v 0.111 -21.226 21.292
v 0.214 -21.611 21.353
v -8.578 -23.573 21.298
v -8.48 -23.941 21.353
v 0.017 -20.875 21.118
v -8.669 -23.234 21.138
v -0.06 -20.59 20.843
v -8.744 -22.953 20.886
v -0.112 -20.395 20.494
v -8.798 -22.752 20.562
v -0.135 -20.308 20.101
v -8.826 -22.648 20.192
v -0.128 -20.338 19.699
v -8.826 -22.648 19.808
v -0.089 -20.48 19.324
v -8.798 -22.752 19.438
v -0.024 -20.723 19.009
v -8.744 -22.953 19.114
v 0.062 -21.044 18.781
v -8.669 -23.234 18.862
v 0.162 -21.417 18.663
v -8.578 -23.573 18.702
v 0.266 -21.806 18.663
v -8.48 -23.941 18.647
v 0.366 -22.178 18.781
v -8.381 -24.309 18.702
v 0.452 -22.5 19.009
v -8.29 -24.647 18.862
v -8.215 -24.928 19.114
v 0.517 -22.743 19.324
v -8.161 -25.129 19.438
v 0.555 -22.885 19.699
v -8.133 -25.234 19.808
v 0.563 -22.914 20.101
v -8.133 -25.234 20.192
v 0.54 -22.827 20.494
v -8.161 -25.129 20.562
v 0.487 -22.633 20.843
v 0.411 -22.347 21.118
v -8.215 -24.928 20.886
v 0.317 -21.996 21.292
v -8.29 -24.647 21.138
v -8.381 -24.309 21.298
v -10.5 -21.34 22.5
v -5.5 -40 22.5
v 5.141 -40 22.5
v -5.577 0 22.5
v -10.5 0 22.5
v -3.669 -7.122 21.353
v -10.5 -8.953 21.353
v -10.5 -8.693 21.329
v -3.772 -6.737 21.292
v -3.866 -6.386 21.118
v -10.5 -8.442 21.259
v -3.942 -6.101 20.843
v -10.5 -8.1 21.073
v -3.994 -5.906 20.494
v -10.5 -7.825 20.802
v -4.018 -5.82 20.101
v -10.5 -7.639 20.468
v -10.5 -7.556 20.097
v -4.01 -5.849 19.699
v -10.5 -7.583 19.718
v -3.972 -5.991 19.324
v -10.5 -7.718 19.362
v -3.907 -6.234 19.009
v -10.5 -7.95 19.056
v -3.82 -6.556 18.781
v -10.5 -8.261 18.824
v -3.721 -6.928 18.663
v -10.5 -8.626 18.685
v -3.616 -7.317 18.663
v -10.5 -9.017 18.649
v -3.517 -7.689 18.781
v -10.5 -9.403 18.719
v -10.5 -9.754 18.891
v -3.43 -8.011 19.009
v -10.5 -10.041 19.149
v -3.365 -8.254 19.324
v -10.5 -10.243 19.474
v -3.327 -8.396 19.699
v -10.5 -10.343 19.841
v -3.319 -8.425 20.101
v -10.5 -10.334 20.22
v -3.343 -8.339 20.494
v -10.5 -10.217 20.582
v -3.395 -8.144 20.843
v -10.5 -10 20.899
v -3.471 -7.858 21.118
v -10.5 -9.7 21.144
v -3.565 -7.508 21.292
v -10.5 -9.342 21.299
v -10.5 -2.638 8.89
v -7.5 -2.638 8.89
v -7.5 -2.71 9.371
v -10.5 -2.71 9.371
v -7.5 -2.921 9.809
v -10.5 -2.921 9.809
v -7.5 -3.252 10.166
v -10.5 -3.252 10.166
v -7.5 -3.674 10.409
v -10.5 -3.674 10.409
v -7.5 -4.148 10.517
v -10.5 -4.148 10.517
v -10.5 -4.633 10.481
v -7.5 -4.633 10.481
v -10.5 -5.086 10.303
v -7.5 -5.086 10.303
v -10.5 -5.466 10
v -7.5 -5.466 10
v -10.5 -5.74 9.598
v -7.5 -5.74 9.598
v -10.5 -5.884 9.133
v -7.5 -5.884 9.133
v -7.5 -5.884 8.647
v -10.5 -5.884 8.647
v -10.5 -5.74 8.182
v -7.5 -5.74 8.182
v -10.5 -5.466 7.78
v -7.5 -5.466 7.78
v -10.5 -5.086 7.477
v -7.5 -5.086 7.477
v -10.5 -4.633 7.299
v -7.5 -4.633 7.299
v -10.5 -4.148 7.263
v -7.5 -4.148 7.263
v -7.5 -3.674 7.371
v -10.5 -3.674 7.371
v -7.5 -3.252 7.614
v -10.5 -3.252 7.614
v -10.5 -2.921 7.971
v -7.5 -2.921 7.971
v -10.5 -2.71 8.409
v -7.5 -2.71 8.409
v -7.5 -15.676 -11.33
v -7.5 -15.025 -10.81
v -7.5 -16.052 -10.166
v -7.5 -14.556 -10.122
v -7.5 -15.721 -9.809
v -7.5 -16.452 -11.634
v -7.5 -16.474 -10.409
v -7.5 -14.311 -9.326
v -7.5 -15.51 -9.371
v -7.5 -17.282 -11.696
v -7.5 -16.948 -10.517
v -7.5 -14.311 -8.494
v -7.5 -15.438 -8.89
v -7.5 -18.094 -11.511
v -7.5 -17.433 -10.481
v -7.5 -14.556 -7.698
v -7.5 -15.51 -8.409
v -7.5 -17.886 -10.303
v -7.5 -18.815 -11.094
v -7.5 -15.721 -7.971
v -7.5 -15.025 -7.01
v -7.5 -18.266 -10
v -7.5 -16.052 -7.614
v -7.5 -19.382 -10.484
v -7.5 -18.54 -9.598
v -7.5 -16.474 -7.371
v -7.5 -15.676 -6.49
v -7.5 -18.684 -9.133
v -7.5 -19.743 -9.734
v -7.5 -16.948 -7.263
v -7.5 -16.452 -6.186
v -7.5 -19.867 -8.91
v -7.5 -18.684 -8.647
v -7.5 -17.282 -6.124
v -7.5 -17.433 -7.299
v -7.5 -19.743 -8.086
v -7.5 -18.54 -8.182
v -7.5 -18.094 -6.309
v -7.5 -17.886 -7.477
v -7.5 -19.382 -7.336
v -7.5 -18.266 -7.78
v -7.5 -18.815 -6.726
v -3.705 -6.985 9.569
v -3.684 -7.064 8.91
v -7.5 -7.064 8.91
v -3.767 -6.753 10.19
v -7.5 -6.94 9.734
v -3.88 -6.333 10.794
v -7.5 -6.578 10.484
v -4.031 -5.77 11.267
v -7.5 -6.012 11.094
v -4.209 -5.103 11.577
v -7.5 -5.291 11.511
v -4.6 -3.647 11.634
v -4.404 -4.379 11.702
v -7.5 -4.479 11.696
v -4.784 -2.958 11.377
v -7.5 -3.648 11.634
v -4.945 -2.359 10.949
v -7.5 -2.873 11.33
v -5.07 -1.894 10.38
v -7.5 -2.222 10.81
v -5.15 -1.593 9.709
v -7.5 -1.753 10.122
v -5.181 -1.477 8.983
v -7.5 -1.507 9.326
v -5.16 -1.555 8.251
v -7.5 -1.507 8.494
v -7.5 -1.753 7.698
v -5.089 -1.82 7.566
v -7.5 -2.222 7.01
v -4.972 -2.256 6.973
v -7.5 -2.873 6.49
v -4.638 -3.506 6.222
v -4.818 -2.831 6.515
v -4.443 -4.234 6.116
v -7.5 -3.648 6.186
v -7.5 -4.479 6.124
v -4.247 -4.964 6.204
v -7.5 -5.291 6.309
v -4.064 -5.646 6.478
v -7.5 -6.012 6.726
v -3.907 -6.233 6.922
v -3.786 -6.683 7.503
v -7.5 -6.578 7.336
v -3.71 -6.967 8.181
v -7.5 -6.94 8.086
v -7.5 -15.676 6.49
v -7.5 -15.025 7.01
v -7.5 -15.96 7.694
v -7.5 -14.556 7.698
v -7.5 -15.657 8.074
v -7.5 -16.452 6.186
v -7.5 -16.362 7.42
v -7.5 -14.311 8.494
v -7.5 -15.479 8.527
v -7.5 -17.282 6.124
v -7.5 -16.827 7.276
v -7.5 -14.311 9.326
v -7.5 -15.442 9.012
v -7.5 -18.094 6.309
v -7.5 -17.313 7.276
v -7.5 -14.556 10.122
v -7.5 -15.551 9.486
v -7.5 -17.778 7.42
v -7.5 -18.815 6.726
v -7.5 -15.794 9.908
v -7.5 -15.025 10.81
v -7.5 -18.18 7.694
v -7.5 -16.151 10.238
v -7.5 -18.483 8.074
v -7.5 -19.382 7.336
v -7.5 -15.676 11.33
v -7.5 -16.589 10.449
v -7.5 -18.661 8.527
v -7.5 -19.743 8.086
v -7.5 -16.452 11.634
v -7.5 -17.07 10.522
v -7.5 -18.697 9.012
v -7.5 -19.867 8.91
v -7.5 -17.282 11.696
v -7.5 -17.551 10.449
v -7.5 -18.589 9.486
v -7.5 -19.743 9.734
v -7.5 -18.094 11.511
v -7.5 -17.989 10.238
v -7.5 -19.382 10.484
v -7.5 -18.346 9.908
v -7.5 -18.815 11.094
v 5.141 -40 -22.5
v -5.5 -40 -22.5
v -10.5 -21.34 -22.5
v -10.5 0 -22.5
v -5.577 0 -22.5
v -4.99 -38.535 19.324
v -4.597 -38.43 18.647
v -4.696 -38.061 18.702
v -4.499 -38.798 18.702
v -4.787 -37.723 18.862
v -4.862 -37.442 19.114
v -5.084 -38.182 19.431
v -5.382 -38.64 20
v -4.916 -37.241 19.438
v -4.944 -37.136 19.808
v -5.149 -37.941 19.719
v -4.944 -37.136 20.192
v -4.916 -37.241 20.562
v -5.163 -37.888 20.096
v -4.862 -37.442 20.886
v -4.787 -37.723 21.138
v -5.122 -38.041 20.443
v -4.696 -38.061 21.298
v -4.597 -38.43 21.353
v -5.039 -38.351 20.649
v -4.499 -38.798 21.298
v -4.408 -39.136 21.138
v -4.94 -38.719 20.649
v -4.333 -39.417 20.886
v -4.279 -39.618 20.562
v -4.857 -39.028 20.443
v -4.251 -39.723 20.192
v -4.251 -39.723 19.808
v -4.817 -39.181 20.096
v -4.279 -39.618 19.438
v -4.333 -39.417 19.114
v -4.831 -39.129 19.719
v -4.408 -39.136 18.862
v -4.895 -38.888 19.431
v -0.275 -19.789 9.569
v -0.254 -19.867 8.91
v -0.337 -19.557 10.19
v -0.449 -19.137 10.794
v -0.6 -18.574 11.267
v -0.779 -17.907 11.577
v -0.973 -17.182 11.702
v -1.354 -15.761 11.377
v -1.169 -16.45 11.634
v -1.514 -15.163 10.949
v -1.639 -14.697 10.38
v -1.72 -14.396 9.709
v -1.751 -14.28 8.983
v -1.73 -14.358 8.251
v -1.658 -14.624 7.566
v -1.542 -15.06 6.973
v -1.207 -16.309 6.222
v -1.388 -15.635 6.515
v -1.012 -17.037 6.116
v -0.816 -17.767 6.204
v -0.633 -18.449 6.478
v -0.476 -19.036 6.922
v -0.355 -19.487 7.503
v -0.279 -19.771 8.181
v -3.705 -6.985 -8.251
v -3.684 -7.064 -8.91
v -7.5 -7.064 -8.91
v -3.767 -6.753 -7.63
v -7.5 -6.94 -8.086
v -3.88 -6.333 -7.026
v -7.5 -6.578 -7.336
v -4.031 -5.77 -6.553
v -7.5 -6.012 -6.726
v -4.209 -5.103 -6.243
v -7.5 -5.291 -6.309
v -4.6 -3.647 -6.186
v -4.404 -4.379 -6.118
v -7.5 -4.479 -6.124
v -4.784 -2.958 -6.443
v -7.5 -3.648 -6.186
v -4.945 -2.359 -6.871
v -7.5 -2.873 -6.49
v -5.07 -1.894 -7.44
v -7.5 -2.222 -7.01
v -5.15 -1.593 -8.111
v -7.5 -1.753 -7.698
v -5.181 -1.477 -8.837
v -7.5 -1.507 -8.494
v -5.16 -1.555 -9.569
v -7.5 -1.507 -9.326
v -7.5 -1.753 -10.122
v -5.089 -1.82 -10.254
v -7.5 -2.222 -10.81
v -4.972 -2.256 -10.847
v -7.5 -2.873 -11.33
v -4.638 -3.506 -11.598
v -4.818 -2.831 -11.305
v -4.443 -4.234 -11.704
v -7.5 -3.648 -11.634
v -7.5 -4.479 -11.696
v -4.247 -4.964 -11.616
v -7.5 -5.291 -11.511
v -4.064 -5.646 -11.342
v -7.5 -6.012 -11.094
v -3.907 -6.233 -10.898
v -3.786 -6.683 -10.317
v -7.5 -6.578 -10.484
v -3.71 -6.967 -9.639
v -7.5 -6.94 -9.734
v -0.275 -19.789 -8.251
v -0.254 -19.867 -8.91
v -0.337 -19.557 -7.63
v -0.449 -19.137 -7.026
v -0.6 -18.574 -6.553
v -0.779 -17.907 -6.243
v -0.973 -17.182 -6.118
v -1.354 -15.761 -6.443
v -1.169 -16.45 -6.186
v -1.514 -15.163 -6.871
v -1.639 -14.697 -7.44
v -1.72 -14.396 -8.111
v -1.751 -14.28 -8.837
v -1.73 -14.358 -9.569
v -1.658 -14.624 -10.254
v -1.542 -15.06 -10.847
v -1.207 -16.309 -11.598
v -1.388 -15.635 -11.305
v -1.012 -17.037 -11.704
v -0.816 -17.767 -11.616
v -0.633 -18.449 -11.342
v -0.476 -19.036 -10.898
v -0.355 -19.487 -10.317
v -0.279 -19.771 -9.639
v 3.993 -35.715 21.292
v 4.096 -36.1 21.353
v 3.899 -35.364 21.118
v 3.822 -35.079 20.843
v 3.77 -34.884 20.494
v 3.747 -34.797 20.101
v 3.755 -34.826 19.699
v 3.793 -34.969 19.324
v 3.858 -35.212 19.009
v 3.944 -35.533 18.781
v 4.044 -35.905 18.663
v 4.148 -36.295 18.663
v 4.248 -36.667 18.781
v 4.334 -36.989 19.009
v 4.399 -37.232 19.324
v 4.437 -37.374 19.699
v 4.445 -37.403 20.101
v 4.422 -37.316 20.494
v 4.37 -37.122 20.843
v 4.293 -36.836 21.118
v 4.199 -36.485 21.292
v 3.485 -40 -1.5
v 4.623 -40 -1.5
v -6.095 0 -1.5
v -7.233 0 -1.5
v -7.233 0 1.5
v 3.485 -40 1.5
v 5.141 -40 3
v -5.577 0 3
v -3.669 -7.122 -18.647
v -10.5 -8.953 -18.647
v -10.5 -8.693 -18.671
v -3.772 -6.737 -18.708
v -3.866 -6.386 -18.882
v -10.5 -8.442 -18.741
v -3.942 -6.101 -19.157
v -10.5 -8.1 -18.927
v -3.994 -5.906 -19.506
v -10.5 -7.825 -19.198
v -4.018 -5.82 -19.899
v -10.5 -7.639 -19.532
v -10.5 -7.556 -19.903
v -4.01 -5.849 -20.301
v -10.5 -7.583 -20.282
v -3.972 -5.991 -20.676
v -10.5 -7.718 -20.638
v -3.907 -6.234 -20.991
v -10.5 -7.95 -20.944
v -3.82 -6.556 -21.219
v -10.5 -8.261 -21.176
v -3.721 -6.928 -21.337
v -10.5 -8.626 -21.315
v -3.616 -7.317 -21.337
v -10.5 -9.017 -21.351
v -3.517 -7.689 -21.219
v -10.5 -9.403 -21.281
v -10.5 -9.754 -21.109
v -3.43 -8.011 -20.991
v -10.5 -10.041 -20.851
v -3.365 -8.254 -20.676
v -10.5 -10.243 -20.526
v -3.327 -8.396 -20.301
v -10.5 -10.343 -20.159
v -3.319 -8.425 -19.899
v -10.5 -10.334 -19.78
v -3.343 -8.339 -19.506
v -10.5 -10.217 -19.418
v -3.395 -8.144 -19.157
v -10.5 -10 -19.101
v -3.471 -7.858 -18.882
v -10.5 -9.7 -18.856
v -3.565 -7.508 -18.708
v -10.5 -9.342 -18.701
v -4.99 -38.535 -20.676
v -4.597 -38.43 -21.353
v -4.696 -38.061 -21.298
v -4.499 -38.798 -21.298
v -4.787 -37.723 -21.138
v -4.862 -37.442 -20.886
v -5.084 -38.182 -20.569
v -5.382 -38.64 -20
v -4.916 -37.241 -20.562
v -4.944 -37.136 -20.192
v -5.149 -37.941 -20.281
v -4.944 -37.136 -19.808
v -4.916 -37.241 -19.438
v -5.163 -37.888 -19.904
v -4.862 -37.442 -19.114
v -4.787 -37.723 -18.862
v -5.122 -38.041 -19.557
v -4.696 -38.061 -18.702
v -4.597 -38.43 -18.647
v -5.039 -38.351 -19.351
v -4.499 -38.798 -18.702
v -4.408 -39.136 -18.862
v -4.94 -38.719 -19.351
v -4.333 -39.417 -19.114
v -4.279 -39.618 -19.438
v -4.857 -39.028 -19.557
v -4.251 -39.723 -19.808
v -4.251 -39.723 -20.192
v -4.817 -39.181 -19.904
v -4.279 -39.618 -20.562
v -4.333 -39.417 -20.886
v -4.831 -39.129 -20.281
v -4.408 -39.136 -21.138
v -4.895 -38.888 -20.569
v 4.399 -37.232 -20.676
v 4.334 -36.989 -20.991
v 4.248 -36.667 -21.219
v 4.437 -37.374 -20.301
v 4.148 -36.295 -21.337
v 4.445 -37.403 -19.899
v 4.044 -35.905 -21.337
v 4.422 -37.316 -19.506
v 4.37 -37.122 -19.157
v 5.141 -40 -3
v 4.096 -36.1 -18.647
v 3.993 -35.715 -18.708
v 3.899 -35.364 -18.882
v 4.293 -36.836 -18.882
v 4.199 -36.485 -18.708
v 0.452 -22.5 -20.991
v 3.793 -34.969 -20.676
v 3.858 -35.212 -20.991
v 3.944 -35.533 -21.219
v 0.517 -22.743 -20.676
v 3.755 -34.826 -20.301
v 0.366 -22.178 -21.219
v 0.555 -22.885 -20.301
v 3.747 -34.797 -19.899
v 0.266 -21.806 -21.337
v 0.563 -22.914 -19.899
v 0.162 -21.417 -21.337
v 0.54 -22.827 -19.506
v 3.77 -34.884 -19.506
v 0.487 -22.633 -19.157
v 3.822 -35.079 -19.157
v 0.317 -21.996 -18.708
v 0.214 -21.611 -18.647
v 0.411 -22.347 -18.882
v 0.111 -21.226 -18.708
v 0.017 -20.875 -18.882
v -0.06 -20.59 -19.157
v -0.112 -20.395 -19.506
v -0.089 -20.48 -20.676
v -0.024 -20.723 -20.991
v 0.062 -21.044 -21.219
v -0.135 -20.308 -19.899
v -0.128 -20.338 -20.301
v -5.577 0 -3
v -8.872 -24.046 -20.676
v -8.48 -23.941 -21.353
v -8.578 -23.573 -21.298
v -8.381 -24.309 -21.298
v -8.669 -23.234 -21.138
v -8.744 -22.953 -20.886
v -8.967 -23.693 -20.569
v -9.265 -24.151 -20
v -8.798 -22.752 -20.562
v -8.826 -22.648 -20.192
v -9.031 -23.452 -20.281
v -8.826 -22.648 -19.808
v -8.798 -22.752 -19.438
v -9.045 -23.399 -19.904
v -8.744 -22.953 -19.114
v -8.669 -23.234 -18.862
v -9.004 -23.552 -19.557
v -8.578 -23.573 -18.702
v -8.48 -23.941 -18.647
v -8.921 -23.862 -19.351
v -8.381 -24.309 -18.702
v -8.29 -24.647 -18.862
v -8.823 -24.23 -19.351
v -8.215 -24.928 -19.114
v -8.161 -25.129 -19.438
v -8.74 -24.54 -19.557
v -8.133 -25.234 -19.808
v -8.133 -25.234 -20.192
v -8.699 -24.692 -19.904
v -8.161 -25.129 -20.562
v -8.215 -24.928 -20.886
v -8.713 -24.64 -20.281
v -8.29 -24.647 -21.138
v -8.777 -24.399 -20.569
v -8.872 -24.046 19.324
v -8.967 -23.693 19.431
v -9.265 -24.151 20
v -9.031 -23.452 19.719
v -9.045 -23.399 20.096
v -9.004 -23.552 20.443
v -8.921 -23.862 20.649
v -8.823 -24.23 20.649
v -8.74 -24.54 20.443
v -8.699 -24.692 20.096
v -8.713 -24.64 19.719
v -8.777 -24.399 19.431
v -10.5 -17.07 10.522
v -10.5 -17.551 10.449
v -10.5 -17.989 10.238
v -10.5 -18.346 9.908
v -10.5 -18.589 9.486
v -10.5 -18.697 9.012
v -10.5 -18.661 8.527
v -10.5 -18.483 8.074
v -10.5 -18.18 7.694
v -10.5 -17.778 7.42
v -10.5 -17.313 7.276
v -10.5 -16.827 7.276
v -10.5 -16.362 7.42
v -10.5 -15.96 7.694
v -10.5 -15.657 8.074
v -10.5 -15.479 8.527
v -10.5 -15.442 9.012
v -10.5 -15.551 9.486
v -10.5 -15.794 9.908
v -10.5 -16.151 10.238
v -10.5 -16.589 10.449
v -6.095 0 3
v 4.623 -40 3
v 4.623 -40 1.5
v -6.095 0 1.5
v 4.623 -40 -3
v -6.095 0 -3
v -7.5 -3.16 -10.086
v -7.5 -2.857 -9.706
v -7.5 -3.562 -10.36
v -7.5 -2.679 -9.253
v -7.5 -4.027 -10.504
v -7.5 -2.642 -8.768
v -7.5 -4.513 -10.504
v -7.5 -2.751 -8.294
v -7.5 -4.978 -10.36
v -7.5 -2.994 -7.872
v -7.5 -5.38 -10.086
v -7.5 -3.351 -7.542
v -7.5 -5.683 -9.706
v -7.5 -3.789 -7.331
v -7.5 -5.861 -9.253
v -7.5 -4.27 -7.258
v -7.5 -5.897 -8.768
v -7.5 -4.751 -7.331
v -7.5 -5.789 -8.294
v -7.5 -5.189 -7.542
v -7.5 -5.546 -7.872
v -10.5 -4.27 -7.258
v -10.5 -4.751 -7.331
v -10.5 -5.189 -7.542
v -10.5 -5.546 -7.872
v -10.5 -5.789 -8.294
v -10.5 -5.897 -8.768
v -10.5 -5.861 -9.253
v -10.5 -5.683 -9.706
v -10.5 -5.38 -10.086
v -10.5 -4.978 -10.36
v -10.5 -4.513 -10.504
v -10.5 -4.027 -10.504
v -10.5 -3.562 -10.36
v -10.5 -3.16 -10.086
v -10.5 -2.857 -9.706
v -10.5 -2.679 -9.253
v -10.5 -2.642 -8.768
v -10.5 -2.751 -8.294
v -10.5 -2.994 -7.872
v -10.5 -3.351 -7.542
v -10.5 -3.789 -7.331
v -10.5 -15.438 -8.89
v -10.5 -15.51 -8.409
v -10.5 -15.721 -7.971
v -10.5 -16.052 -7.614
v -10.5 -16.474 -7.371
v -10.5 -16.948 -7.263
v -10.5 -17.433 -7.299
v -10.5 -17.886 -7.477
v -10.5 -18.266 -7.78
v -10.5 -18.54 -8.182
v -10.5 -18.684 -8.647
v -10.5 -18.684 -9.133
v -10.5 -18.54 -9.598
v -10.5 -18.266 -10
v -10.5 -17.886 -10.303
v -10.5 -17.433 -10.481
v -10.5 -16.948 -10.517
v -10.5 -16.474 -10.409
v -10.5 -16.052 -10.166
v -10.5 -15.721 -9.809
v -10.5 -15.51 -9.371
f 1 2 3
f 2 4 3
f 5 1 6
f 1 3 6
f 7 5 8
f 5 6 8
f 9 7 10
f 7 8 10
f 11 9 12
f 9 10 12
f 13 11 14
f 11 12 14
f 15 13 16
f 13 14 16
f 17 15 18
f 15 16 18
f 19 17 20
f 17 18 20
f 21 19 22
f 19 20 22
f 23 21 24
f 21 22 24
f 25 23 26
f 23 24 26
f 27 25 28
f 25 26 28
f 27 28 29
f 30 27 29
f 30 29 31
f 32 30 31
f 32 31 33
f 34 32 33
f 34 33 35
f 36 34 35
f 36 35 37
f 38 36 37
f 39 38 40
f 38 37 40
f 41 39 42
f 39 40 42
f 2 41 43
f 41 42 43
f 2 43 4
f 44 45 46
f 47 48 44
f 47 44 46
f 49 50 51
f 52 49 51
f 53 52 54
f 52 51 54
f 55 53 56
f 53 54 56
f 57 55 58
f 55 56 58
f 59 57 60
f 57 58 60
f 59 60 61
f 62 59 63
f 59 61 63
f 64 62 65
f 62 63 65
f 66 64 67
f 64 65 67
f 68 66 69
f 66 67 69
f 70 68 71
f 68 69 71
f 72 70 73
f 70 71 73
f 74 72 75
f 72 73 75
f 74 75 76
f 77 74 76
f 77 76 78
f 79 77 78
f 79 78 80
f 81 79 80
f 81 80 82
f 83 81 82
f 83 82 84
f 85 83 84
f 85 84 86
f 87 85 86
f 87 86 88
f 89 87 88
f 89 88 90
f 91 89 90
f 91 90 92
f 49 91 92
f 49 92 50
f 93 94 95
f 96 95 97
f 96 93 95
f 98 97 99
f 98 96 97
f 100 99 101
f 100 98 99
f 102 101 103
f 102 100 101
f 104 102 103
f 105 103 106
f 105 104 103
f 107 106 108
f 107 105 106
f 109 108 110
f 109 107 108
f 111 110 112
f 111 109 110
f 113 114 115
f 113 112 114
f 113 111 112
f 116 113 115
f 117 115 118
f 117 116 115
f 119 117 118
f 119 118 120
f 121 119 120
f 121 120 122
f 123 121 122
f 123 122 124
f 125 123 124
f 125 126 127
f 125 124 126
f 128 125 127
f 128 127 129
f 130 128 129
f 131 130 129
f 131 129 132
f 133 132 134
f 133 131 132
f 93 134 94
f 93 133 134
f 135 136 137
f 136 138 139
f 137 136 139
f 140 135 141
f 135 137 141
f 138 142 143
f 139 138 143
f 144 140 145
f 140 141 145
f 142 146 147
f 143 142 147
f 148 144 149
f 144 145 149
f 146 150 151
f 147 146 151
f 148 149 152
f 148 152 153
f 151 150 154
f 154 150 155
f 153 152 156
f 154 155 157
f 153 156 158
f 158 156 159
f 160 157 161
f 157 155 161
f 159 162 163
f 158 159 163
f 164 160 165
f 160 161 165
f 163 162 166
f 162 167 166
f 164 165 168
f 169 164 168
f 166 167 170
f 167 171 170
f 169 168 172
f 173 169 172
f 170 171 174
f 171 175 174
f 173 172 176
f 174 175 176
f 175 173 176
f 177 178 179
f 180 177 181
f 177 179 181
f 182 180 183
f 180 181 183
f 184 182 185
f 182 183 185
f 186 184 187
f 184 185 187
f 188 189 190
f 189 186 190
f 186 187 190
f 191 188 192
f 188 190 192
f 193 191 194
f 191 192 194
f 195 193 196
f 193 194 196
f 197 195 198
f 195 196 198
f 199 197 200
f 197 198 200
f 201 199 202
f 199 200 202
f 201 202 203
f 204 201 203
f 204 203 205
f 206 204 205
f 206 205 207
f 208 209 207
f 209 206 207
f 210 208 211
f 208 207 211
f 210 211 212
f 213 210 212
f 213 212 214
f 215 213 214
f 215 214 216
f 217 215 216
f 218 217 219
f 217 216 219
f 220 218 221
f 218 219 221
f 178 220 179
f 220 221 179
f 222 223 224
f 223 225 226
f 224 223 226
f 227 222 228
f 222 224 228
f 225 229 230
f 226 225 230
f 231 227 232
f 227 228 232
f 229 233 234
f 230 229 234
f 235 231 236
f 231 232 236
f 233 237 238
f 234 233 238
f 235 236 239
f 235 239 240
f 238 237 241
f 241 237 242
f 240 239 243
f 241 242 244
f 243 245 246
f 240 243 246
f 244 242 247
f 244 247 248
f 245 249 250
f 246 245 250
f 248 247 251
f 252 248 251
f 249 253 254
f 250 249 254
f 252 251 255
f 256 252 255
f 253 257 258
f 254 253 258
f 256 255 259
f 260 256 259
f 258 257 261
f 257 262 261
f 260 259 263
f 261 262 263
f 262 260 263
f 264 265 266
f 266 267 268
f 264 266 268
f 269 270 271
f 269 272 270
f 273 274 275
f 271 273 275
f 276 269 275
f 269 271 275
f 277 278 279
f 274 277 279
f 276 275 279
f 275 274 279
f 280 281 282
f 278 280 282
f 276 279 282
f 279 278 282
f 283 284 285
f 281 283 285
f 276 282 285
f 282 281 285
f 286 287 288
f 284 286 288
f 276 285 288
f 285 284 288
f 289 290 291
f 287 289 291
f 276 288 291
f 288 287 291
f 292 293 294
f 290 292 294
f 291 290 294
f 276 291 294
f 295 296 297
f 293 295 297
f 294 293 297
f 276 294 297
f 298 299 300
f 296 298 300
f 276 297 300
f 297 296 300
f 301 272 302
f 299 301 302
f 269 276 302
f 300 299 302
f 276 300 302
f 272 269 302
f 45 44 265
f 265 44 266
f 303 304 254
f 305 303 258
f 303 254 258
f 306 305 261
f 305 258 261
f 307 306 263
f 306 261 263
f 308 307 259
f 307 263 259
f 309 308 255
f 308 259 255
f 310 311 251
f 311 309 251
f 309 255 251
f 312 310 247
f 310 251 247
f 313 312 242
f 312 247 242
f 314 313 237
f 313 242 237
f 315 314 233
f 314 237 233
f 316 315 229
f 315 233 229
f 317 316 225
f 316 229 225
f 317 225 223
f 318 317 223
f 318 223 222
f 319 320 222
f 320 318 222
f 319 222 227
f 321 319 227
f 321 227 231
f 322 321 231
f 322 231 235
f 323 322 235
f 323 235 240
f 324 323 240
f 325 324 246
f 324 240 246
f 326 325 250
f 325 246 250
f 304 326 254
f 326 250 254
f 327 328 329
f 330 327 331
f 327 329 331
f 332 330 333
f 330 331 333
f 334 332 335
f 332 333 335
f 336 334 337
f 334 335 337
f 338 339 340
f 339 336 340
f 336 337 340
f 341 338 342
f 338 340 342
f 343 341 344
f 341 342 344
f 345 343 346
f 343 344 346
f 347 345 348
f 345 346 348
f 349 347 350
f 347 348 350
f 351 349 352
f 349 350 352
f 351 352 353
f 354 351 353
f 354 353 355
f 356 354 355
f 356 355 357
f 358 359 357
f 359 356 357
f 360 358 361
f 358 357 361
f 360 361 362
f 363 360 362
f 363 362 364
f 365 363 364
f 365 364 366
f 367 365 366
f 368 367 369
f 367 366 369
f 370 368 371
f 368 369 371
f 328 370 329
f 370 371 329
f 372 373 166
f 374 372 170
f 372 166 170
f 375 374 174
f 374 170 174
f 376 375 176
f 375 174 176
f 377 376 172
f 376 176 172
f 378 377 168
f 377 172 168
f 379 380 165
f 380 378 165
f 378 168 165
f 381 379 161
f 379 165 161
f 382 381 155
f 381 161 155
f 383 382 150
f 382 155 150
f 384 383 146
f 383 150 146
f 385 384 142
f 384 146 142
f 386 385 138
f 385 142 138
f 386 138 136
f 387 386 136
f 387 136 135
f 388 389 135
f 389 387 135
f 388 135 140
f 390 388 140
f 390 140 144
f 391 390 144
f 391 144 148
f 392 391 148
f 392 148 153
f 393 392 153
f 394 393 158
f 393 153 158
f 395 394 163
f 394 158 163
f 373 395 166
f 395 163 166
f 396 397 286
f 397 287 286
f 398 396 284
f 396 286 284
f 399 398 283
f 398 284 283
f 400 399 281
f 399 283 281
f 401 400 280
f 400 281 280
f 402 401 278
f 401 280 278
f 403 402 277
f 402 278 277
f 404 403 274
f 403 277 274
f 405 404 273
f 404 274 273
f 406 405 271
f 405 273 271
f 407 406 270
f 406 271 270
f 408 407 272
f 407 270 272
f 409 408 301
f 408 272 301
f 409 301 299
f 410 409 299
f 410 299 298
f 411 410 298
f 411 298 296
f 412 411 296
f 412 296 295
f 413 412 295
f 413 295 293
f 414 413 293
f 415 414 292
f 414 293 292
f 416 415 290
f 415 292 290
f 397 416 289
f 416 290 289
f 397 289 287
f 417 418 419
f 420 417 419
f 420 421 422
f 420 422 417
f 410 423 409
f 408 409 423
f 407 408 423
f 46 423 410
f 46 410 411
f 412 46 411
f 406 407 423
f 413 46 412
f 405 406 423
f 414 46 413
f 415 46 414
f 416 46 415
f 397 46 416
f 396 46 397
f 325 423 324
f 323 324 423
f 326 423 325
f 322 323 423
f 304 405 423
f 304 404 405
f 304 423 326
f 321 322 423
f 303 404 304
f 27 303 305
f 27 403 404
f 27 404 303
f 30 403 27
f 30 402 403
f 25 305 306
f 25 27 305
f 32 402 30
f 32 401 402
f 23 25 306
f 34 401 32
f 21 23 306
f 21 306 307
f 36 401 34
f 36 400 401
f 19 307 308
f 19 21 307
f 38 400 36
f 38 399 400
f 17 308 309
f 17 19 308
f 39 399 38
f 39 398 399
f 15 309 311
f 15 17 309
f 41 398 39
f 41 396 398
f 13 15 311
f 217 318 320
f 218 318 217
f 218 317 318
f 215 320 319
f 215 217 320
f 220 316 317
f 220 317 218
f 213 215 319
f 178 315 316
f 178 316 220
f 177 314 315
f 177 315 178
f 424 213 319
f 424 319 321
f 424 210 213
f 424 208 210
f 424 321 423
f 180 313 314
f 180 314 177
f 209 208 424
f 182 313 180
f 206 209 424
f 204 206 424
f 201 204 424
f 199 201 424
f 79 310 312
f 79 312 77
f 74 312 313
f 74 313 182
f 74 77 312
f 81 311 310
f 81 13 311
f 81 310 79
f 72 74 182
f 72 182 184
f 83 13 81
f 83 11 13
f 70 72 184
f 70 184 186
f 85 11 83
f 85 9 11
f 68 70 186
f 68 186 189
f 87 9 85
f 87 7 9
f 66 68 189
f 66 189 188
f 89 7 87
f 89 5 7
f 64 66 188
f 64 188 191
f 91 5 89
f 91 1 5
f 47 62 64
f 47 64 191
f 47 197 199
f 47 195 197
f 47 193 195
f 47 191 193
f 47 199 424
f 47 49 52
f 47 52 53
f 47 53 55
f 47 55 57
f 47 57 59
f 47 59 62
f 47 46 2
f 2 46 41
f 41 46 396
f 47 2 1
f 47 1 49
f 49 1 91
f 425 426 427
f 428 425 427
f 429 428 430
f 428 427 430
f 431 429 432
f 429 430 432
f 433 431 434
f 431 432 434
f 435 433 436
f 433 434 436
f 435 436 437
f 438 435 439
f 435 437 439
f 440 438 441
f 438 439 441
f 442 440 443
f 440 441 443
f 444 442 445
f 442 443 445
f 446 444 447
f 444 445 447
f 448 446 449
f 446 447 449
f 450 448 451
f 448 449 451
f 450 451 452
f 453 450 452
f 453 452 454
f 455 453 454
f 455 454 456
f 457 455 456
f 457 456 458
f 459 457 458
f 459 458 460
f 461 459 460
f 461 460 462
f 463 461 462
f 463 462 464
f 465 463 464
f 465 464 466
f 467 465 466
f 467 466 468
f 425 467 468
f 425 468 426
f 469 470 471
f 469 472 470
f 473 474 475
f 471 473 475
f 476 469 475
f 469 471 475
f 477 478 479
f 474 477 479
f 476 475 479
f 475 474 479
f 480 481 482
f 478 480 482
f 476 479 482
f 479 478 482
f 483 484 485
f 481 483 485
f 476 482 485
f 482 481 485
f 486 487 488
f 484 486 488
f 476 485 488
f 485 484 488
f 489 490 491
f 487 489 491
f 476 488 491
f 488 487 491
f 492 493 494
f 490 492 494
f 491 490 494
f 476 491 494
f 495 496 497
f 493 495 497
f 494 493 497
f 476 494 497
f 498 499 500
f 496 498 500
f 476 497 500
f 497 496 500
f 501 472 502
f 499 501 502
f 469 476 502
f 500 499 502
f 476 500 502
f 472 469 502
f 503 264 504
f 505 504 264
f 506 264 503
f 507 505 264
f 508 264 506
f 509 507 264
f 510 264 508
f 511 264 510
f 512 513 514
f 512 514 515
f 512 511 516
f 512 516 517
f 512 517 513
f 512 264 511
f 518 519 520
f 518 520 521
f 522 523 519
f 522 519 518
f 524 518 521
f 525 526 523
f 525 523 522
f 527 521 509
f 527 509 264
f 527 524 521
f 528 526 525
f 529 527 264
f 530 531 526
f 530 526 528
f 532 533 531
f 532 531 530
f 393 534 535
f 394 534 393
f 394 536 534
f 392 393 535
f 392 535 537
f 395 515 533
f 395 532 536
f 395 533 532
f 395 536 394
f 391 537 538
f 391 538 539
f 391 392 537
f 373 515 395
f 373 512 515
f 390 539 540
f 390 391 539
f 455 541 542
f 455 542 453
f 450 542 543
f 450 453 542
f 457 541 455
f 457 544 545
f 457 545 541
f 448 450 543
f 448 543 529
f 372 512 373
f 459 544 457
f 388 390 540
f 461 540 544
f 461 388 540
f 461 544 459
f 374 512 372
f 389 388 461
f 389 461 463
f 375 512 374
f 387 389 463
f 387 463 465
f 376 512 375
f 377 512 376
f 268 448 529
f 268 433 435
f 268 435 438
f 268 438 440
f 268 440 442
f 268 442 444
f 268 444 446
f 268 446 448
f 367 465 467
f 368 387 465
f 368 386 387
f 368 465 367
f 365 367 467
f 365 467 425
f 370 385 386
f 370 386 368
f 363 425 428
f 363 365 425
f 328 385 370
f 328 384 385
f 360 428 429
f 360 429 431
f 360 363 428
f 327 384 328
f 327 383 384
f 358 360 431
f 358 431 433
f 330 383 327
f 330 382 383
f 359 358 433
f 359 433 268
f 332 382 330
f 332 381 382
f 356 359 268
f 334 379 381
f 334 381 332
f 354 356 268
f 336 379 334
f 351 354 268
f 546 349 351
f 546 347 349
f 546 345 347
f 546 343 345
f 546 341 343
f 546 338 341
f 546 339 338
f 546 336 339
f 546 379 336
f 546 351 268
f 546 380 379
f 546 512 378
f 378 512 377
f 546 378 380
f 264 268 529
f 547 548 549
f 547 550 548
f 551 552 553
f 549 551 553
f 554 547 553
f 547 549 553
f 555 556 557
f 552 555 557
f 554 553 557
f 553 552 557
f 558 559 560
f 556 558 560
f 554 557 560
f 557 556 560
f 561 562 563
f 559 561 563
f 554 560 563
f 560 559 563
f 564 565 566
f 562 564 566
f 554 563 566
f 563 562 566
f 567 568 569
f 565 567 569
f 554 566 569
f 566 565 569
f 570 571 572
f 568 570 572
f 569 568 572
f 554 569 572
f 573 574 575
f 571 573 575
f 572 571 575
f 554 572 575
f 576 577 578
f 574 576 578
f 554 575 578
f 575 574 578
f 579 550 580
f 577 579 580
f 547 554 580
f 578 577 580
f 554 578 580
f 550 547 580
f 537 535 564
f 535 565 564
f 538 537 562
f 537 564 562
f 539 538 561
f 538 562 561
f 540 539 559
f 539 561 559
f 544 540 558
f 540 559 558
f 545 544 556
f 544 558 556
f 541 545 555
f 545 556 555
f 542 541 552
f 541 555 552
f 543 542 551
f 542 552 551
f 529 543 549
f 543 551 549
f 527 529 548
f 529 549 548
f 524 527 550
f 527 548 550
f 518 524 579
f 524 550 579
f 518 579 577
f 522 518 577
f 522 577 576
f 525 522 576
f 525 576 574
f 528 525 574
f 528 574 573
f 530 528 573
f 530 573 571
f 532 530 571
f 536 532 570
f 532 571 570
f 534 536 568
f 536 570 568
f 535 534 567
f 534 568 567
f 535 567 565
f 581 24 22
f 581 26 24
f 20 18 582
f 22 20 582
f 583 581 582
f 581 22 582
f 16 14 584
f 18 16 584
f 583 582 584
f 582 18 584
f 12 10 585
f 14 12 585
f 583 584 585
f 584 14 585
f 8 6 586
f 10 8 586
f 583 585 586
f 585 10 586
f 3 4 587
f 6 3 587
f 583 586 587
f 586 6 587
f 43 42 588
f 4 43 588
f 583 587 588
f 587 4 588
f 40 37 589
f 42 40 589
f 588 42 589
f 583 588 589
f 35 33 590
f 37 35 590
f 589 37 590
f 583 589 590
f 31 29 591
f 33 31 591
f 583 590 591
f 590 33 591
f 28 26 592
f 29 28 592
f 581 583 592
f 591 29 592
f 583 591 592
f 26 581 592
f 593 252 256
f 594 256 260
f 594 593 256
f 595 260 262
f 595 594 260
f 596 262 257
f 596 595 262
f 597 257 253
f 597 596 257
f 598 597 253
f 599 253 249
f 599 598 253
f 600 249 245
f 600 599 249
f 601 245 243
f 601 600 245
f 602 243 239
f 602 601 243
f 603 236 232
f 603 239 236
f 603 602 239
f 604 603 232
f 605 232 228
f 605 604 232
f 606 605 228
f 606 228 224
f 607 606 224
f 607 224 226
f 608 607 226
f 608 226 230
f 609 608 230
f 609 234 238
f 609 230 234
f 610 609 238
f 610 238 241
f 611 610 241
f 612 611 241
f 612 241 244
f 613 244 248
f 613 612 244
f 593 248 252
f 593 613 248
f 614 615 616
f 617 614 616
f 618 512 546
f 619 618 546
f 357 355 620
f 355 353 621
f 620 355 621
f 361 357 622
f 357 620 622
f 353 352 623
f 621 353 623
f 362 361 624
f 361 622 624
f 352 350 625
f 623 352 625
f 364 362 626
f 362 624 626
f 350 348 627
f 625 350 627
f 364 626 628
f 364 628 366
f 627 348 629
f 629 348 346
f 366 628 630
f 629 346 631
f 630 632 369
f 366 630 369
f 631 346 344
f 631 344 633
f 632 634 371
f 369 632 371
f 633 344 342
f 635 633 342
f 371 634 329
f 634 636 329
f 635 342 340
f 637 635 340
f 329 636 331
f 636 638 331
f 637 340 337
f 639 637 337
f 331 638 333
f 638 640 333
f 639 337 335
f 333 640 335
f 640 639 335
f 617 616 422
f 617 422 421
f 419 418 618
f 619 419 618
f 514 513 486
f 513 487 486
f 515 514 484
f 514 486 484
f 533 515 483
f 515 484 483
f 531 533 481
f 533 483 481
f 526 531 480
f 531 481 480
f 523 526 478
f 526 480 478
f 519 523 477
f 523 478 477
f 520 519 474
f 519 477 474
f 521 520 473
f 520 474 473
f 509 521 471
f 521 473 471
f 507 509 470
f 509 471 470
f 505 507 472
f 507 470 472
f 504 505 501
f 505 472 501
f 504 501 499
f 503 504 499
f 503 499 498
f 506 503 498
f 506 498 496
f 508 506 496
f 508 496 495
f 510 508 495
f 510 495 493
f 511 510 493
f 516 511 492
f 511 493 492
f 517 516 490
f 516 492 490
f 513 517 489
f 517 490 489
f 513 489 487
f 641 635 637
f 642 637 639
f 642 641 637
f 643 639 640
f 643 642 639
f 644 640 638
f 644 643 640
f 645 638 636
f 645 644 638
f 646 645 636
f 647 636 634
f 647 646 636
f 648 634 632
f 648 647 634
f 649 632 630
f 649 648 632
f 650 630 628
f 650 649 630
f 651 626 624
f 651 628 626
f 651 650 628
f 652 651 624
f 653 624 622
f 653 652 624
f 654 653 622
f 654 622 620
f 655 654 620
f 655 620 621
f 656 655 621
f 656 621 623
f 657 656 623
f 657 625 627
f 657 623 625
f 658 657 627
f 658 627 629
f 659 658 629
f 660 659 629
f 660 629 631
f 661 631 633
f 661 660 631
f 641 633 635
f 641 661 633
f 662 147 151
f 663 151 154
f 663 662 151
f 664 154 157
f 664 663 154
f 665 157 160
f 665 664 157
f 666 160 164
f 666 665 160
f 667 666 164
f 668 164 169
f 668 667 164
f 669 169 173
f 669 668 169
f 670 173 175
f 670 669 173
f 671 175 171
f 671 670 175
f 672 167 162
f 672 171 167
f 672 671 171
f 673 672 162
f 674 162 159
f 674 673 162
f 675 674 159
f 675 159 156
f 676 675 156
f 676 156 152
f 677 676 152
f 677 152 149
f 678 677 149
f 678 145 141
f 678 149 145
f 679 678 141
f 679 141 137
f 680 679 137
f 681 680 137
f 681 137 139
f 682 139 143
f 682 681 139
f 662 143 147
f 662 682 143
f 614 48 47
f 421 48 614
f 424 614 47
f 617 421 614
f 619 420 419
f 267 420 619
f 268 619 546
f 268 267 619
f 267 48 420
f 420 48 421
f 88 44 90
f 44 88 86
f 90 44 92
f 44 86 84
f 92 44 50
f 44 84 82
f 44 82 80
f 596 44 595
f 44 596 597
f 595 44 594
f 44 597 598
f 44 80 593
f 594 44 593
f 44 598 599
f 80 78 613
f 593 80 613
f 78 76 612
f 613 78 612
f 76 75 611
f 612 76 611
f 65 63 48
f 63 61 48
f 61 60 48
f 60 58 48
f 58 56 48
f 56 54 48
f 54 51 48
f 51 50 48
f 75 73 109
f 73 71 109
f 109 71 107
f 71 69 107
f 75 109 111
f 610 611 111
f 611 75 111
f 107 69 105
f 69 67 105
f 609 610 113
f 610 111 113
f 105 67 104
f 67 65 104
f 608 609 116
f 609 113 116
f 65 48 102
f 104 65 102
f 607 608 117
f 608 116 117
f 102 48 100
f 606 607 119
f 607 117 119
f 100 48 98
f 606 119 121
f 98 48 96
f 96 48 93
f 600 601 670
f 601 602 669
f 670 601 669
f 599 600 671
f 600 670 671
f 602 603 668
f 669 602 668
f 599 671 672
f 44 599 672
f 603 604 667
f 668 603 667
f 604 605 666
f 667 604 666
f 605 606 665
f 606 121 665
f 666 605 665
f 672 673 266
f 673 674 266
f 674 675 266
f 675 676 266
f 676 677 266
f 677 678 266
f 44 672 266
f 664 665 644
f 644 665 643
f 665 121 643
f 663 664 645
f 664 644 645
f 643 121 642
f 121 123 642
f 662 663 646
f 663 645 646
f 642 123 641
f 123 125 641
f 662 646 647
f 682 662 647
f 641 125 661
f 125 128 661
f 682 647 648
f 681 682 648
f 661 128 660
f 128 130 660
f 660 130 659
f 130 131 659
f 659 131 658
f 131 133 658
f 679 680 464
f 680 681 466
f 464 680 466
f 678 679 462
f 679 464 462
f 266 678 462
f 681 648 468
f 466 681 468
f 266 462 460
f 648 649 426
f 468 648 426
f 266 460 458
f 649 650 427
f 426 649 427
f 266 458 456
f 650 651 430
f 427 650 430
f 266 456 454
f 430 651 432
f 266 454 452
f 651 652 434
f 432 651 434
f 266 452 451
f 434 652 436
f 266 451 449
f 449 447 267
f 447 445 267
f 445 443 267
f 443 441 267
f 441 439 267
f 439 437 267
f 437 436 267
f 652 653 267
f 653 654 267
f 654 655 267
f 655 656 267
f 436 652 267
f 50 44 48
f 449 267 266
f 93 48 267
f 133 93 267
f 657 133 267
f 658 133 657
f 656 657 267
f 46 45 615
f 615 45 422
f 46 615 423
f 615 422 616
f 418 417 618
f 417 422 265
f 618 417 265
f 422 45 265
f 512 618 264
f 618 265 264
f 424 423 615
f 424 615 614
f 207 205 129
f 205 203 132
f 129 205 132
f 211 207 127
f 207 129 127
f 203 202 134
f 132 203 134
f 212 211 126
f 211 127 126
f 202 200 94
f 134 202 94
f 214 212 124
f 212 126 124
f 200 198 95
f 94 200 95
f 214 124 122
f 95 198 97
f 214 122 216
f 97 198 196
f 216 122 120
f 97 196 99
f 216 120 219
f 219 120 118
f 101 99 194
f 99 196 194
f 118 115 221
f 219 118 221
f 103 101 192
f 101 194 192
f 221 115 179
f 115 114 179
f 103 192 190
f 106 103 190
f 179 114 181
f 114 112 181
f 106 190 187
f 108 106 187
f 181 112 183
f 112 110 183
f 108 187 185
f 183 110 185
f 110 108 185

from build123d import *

# Parameters (mm, degrees)
SKETCH1_W                 = 21
SKETCH1_H                 = 45
BOSS_EXTRUDE1_DEPTH       = 40
CHAMFER1_SIZE             = 60
CHAMFER1_SIZE_2           = 16.076951546
SKETCH2_W                 = 3
SKETCH2_H                 = 45
CUT_EXTRUDE1_DEPTH        = 1.6
F_6_32_TAPPED_HOLE1_D     = 2.7051
F_6_32_TAPPED_HOLE1_DEPTH = 9
F_6_32_TAPPED_HOLE1_TIP   = 0.81269403
CHAMFER2_SIZE             = 5
CHAMFER2_SIZE2            = 18.660254038
SKETCH11_R                = 1.63195
CUT_EXTRUDE3_DEPTH        = 10
F_3DSKETCH1_R             = 2.794
CUT_EXTRUDE4_DEPTH        = 8
SKETCH12_W                = 6
SKETCH12_H                = 45
CUT_EXTRUDE5_DEPTH        = 0.5


with BuildPart() as part:
    # Sketch1 → Boss-Extrude1 (new body)
    with BuildSketch(Plane(origin=(0, 0, 0), x_dir=(1, 0, 0), z_dir=(0, 1, 0))):
        Rectangle(SKETCH1_W, SKETCH1_H)
    extrude(amount=-BOSS_EXTRUDE1_DEPTH)

    # Chamfer1
    # the kernel refuses this chamfer: 60, 16.076951546 mm, written as the material it takes off along each edge
    with BuildSketch(Plane(origin=(10.5, 0, 178.303294212), x_dir=(0.009967146577156426, -0.9999503267608394, 0), z_dir=(0, 0, -1))) as chamfer1_piece_1:
        Polygon((CHAMFER1_SIZE * 0.999950326761, CHAMFER1_SIZE * 0.00996714657716), (-CHAMFER1_SIZE_2 * 0.00996714657707, CHAMFER1_SIZE_2 * 0.999950326753), (0, 0), align=None)
    extrude(amount=356.606588424, mode=Mode.SUBTRACT)

    # Sketch2 → Cut-Extrude1 (cut)
    with BuildSketch(Plane(origin=(-5.20336663, -1.394237886, 0), x_dir=(0, 0, -1), z_dir=(0.965925826289069, 0.2588190451025185, 0))):
        with Locations((0, -19.262102335)):
            Rectangle(SKETCH2_W, SKETCH2_H)
    extrude(amount=-CUT_EXTRUDE1_DEPTH, mode=Mode.SUBTRACT)

    # #6-32 Tapped Hole1
    with Locations(Plane(origin=(-5.20336663, -1.394237886, 0), x_dir=(0, 0, -1), z_dir=(0.965925826289069, 0.2588190451025185, 0))):
        with Locations((-20, -20.93024544), (20, -20.93024544), (-20, -5.93024544), (-20, -35.93024544), (20, -35.93024544), (20, -5.93024544)):
            Hole(F_6_32_TAPPED_HOLE1_D / 2, depth=F_6_32_TAPPED_HOLE1_DEPTH)
            with Locations((0, 0, -(F_6_32_TAPPED_HOLE1_DEPTH + F_6_32_TAPPED_HOLE1_TIP / 2))):  # 118° drill point
                Cone(0, F_6_32_TAPPED_HOLE1_D / 2, F_6_32_TAPPED_HOLE1_TIP, mode=Mode.SUBTRACT)

    # Chamfer2
    chamfer2_edges = [part.edges().sort_by_distance(p)[0] for p in [
        (-10.5, -40, 0),
    ]]
    chamfer2_side = [part.faces().sort_by_distance(p)[0] for p in [
        (-2.729210232, -40, 0),
    ]]
    chamfer(chamfer2_edges, length=CHAMFER2_SIZE, length2=CHAMFER2_SIZE2, reference=chamfer2_side[0])

    # Sketch11 → Cut-Extrude3 (cut)
    with BuildSketch(Plane(origin=(-10.5, 29.282032303, 0), x_dir=(0, 0, 1), z_dir=(1, 0, 0))):
        with Locations(Location((8.89, 33.551905284, 0), (0, 0, 270))):
            Circle(SKETCH11_R)
        with Locations((8.89, 46.351905284)):
            Circle(SKETCH11_R)
        with Locations(Location((-8.89, 46.351905284, 0), (0, 0, 270))):
            Circle(SKETCH11_R)
        with Locations((-8.89, 33.551905284)):
            Circle(SKETCH11_R)
    extrude(amount=CUT_EXTRUDE3_DEPTH, mode=Mode.SUBTRACT)

    # 3DSketch1 → Cut-Extrude4 (cut)
    with BuildSketch(Plane(origin=(-7.5, -4.269872981, -8.91), x_dir=(0, -0.5834969796278836, 0.812115308786343), z_dir=(-1, 0, 0))):
        with Locations(Location((0, 0, 0), (0, 0, 305.696879334))):
            Circle(F_3DSKETCH1_R)
        with Locations(Location((14.471894803, 10.397916177, 0), (0, 0, 305.696879334))):
            Circle(F_3DSKETCH1_R)
        with Locations(Location((21.942696816, 0, 0), (0, 0, 305.696879334))):
            Circle(F_3DSKETCH1_R)
        with Locations(Location((7.470802013, -10.397916177, 0), (0, 0, 305.696879334))):
            Circle(F_3DSKETCH1_R)
    extrude(amount=-CUT_EXTRUDE4_DEPTH, mode=Mode.SUBTRACT)

    # Sketch12 → Cut-Extrude5 (cut)
    with BuildSketch(Plane(origin=(-5.20336663, -1.394237886, 0), x_dir=(0, 0, -1), z_dir=(0.9659258262890663, 0.25881904510252807, 0))):
        with Locations((0, -20.203205195)):
            Rectangle(SKETCH12_W, SKETCH12_H)
    extrude(amount=-CUT_EXTRUDE5_DEPTH, mode=Mode.SUBTRACT)


solid = part.part
